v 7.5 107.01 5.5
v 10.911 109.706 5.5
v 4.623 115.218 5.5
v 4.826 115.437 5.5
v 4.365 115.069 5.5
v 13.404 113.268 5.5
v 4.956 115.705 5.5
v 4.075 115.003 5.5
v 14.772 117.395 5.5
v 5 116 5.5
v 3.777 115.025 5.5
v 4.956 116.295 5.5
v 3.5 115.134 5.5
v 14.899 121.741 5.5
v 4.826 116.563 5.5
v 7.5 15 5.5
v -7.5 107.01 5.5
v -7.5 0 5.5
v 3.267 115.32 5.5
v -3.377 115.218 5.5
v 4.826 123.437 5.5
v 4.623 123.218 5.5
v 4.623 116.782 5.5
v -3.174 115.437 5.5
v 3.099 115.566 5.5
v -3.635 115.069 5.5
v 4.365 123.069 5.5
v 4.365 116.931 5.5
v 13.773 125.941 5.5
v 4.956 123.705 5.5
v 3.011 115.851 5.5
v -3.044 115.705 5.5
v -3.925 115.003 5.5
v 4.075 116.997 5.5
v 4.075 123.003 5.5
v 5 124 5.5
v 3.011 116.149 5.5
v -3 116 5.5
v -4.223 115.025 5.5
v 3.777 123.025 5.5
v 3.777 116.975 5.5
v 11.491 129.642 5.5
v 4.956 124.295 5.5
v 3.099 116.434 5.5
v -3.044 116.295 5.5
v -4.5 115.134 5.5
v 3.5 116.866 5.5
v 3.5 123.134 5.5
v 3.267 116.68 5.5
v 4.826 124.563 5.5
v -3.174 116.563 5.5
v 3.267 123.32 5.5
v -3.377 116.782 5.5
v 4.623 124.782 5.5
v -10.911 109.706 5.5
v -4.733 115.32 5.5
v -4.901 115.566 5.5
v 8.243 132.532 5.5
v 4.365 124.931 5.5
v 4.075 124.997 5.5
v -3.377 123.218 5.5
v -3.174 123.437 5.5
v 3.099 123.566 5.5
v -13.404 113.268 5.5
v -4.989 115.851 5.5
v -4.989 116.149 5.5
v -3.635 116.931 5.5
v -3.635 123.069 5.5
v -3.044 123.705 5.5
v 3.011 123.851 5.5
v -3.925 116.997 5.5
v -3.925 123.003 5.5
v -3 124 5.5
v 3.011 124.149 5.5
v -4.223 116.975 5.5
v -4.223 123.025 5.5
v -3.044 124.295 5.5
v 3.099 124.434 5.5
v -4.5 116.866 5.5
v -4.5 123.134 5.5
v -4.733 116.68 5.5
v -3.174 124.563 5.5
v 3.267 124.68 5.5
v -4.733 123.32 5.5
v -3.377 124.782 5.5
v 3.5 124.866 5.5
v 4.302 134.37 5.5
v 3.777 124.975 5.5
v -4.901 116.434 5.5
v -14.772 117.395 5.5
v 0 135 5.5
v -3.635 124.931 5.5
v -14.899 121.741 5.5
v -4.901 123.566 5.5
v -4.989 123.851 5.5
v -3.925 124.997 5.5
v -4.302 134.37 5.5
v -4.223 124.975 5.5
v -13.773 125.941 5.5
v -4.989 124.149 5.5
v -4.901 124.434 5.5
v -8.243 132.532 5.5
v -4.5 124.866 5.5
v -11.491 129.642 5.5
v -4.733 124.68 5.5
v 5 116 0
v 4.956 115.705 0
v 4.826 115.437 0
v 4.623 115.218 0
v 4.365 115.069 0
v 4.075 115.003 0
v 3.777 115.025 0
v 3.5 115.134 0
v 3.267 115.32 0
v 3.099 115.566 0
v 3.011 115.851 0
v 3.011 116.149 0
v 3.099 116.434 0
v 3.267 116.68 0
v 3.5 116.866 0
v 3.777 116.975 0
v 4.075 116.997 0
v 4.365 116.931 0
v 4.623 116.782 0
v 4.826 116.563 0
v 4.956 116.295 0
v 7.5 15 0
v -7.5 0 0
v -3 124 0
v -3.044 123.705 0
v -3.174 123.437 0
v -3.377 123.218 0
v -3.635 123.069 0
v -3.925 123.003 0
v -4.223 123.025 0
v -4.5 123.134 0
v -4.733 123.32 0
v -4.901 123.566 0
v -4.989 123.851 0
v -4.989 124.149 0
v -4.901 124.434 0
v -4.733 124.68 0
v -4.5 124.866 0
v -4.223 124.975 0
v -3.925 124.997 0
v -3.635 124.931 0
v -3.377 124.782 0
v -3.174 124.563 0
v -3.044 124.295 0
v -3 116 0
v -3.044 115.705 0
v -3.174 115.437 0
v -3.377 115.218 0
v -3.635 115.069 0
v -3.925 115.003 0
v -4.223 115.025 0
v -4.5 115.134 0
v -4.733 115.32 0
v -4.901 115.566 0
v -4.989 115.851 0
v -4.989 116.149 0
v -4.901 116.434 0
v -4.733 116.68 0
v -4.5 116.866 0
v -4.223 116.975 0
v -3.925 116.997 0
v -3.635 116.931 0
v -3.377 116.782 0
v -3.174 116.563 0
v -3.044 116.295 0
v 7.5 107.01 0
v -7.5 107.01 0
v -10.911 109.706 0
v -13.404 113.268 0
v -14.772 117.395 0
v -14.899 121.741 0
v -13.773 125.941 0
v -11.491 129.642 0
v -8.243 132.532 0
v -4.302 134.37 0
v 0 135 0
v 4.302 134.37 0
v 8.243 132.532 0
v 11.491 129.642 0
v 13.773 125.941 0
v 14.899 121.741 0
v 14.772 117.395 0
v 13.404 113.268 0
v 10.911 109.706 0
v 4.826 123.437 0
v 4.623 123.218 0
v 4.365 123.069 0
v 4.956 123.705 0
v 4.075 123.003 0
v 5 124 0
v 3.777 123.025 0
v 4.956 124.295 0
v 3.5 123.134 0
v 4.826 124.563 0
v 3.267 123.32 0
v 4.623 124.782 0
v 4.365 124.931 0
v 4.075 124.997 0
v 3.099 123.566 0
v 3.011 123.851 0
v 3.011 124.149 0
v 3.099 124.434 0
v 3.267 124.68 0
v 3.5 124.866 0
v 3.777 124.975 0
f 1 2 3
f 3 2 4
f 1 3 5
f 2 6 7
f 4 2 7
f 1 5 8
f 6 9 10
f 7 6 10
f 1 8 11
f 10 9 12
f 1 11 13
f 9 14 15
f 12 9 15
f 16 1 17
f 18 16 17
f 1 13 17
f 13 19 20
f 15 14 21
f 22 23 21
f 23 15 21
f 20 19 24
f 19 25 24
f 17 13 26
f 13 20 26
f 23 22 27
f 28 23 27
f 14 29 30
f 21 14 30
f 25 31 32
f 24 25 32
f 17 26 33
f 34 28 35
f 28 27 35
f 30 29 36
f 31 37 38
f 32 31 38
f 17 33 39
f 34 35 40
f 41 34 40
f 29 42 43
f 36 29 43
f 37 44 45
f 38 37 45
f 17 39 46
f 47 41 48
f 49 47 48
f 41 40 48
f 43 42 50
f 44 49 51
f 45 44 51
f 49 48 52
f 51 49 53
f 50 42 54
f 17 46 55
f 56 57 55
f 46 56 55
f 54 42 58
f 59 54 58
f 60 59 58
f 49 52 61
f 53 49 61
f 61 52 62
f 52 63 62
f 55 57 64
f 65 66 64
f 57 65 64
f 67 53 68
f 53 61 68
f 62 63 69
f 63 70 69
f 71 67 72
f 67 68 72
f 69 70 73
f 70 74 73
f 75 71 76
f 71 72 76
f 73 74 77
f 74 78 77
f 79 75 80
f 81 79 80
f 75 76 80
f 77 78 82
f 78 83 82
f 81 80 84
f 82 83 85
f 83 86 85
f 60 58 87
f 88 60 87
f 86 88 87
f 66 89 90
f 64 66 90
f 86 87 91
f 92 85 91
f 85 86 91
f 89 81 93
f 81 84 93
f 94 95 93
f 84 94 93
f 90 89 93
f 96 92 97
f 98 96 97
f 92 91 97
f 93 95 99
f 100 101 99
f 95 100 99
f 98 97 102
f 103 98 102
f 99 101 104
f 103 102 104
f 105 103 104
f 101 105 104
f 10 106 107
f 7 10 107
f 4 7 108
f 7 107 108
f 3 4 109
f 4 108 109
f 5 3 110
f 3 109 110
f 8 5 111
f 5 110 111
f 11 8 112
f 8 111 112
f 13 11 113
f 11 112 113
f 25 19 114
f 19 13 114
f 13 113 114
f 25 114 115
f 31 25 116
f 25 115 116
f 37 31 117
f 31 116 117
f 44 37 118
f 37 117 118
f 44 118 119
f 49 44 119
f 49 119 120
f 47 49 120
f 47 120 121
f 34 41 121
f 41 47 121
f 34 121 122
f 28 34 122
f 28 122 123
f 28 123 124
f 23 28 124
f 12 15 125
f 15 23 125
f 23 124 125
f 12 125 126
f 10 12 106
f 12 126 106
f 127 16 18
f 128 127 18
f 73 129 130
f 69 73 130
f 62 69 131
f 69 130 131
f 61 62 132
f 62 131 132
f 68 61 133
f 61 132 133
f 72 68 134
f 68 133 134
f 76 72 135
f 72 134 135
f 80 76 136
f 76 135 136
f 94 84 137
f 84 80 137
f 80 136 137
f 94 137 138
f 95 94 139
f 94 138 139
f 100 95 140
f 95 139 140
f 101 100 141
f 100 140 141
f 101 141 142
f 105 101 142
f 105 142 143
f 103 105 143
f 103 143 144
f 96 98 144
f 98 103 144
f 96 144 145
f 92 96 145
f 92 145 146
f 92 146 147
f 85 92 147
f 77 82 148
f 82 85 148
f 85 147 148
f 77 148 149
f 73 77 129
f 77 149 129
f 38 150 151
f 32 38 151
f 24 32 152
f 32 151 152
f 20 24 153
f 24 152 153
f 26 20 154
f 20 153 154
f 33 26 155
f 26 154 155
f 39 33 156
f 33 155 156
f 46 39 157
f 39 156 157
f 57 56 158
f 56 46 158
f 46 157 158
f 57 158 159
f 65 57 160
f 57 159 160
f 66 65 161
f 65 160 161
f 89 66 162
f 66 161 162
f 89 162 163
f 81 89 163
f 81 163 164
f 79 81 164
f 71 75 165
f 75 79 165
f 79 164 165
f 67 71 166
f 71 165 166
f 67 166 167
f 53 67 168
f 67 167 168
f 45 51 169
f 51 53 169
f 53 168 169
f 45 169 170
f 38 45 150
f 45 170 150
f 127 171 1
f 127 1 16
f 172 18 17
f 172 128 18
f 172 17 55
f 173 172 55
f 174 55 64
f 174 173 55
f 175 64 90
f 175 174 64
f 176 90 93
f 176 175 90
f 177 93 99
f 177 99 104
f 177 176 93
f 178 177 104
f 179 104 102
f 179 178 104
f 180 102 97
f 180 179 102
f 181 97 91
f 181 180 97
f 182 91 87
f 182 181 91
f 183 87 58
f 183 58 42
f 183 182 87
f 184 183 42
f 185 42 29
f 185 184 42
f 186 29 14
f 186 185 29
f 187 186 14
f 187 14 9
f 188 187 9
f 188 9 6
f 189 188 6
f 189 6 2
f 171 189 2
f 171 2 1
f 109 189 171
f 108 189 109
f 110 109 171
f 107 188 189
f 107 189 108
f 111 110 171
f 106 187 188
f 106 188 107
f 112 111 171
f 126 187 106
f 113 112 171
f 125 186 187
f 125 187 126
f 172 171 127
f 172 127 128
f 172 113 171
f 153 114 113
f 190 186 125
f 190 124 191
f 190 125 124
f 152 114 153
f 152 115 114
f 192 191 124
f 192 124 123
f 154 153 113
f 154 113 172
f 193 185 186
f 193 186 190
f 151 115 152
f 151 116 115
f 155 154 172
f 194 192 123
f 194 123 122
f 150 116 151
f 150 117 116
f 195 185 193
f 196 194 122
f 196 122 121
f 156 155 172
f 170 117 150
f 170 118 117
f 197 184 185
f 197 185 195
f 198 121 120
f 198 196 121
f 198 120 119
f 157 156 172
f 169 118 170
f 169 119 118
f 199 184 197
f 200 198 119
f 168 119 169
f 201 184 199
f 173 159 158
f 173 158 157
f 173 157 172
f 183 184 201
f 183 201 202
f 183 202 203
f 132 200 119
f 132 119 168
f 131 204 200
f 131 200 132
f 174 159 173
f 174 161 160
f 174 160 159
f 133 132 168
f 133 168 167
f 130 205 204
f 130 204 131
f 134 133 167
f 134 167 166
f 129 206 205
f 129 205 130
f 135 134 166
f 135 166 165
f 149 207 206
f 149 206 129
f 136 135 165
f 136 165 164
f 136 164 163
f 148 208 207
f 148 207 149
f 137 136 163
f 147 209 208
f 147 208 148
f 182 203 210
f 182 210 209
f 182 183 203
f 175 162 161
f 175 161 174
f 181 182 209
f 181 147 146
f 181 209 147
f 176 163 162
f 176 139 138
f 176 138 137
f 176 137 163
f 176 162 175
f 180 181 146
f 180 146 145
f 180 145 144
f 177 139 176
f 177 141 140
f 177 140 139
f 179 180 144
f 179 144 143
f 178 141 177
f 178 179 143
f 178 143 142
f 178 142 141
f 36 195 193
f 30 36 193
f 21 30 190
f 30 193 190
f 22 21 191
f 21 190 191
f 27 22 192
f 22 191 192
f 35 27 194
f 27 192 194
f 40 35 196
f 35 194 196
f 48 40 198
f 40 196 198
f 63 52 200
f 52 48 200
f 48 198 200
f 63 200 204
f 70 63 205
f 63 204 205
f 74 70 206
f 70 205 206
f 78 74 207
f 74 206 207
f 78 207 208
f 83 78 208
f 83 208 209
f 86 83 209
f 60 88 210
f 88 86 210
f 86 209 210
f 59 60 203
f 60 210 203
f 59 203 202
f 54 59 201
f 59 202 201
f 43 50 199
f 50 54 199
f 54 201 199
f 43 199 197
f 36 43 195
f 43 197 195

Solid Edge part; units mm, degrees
sketch "Sketch1" plane through (0, 0, 0) normal (0, 0, 1) x (1, 0, 0)
  line L0 (-7.5, 0) -> (-7.5, 107.0096)
  arc A0 (-7.5, 107.0096) -> (7.5, 107.0096) centre (0, 120) cw
  line L1 (7.5, 107.0096) -> (7.5, 0)
  line L2 (7.5, 0) -> (-7.5, 0)
  circle A1 centre (-4, 116) radius 1
  circle A2 centre (4, 124) radius 1
  circle A3 centre (4, 116) radius 1
  circle A4 centre (-4, 124) radius 1
extrude "Protrusion1" add sketch "Sketch1" along normal blind 5.5
sketch "Sketch2" plane through (0, 70, 5.5) normal (0, 0, 1) x (0, -1, 0)
  line L0 (55, 7.5) -> (70, -7.5)
  line L1 (70, 7.5) -> (70, -7.5)
  line L2 (70, 7.5) -> (55, 7.5)
extrude "Cutout1" cut sketch "Sketch2" against normal through all
